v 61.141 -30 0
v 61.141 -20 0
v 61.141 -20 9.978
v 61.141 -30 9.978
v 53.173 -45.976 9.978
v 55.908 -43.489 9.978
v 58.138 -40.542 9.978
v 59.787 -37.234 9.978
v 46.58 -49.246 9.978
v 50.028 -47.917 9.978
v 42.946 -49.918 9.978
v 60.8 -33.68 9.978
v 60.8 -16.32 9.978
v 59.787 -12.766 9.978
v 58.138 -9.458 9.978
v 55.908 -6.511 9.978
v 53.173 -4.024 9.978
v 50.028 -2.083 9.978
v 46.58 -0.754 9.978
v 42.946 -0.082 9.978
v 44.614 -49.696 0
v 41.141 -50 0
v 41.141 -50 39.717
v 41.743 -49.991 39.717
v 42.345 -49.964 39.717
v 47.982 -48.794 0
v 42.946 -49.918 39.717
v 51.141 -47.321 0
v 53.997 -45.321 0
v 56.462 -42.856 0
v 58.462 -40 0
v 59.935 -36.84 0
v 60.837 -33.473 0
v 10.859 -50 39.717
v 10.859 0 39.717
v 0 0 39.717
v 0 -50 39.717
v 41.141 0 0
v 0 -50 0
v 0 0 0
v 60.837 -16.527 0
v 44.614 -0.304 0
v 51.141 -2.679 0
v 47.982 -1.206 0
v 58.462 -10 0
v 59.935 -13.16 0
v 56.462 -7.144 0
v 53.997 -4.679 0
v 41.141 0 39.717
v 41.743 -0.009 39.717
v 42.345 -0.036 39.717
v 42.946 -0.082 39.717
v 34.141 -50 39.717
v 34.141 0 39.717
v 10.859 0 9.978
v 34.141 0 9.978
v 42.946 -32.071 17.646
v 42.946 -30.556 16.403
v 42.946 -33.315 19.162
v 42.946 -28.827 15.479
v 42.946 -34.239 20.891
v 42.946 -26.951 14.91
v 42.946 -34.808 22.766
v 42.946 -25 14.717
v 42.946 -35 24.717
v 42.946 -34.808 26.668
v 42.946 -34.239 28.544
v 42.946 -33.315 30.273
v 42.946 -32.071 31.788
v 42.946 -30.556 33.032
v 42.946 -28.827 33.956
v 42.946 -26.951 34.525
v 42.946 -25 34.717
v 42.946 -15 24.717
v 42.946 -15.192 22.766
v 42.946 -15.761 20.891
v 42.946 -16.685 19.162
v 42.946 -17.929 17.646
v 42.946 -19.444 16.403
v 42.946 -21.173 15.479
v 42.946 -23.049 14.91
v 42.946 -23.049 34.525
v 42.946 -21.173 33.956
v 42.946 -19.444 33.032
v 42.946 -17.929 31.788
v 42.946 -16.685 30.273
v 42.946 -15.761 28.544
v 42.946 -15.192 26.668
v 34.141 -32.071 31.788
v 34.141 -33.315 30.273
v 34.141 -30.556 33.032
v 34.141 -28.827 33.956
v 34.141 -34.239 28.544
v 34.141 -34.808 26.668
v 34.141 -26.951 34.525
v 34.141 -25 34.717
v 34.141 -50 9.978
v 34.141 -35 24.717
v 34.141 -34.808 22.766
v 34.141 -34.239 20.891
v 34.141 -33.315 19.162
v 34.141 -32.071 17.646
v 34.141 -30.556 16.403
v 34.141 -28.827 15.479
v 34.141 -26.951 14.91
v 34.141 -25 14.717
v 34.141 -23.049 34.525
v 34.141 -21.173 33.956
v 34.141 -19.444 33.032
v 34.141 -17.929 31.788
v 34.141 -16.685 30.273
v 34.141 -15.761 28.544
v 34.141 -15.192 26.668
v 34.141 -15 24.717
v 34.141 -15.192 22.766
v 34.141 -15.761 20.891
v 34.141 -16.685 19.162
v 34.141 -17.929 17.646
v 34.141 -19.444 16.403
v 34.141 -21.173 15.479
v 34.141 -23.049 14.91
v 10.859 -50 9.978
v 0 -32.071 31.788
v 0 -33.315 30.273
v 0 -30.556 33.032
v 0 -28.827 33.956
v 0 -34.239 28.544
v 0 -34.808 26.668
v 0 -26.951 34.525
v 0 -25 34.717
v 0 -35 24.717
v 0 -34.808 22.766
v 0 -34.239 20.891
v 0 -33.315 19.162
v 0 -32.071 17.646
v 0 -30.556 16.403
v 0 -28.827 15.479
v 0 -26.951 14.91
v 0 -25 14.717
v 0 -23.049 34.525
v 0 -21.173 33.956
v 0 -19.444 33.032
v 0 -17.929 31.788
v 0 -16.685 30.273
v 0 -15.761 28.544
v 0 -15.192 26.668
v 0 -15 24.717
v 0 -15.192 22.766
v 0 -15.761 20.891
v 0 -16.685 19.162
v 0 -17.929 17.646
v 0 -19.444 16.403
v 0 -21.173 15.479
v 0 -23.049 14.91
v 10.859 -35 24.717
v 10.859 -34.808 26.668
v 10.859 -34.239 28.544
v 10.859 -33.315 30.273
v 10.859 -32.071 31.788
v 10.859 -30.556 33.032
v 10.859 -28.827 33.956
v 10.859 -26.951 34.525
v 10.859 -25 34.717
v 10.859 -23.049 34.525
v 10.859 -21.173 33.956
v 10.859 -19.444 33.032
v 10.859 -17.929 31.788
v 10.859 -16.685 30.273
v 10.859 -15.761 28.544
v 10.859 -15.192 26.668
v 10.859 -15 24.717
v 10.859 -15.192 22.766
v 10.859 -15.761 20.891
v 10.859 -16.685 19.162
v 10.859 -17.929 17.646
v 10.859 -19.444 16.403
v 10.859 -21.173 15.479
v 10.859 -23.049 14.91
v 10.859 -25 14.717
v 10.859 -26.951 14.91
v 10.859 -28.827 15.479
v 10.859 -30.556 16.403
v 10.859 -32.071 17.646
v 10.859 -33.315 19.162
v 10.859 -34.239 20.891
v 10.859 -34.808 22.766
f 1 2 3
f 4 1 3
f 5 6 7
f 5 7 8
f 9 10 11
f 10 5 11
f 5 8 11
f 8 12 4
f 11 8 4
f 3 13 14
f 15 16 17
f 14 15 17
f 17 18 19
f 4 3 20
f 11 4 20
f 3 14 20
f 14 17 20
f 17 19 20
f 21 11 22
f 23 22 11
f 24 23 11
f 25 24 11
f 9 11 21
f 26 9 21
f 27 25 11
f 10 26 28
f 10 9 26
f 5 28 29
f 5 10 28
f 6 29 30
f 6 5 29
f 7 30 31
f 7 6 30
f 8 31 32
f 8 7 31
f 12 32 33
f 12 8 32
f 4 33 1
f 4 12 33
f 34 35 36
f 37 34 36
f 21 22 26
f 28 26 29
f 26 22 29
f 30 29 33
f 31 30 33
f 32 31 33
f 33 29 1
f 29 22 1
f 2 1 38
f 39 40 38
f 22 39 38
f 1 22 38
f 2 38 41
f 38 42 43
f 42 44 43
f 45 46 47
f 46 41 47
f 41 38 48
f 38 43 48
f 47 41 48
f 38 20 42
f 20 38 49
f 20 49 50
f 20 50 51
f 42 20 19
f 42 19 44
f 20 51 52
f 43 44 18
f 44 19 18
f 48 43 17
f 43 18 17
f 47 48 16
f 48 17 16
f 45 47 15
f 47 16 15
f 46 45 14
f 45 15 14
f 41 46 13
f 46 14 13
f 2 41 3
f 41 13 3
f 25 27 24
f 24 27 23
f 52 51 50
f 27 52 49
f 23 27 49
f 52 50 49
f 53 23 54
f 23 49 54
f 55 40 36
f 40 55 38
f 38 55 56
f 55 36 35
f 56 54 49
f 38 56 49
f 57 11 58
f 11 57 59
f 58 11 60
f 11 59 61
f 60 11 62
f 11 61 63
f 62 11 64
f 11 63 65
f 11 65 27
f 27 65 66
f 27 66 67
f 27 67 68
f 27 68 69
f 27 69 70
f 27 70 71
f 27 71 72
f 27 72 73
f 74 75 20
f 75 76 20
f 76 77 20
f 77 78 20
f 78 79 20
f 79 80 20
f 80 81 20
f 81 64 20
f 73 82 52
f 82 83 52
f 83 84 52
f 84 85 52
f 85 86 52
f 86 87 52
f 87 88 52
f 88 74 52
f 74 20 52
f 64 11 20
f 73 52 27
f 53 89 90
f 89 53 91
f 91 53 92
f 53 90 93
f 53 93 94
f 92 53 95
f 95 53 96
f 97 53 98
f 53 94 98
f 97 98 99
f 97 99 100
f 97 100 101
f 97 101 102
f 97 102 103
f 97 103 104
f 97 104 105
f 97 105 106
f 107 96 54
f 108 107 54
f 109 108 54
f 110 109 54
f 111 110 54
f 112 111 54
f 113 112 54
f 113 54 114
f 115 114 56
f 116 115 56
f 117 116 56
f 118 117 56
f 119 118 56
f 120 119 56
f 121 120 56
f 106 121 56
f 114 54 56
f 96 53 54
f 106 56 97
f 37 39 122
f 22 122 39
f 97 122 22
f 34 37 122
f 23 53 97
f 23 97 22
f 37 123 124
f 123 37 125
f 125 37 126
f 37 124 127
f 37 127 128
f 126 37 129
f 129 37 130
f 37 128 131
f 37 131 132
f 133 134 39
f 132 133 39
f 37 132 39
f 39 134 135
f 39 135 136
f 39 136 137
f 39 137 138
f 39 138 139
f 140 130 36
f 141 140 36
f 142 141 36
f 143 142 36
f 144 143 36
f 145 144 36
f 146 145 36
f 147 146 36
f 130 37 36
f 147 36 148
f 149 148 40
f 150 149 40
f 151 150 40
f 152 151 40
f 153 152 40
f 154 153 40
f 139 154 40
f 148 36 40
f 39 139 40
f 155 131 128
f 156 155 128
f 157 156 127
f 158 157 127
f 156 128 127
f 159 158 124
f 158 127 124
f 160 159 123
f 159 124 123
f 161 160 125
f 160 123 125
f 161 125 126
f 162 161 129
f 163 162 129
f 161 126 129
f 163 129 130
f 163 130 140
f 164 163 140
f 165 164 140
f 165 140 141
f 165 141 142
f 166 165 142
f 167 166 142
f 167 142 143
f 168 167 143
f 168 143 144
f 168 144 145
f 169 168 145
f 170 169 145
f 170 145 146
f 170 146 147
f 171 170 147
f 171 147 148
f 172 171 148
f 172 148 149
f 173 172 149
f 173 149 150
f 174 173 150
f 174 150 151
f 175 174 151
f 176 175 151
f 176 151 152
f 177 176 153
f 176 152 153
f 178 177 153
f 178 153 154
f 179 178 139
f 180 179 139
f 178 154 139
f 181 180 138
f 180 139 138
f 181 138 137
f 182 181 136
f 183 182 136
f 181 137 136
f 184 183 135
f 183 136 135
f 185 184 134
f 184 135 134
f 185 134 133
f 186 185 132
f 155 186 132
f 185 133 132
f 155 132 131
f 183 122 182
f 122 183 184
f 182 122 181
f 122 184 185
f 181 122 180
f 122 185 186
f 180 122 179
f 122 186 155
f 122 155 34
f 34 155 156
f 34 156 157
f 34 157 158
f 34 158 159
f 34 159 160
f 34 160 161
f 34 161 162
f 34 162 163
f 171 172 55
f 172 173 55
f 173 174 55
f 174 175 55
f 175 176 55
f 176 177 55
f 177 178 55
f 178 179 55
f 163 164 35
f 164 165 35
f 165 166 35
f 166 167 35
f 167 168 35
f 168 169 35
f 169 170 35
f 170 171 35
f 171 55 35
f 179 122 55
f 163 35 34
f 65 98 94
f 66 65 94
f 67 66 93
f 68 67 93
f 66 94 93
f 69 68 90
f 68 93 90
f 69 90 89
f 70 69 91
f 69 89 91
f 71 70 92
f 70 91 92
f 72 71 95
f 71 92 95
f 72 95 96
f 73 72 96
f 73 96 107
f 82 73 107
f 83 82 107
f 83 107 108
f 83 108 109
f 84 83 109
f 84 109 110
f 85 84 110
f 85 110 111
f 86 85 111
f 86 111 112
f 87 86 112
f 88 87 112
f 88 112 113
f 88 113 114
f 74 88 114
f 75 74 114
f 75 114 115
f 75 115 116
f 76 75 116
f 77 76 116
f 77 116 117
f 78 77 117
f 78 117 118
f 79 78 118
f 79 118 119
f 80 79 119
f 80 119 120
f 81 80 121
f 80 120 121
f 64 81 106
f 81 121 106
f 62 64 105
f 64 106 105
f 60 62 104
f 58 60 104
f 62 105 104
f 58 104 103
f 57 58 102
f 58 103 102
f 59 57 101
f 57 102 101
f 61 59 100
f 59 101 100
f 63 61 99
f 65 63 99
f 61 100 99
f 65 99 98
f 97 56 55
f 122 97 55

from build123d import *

# Parameters (mm, degrees)
F1_DEPTH = 50
F2_R     = 10
F3_DEPTH = 61.142308
F4_R     = 20


with BuildPart() as f1:
    # F0 (on Front) → F1 (new body)
    with BuildSketch(Plane.XZ):
        Polygon((0, 39.717391), (0, 0), (61.141308, 0), (61.141308, 9.978262), (42.945653, 9.978262), (42.945653, 39.717391), (34.141306, 39.717391), (34.141306, 9.978262), (10.858696, 9.978262), (10.858696, 39.717391), align=None)
    extrude(amount=F1_DEPTH)

    # F2 (on face) → F3 (cut, through all)
    with BuildSketch(Plane(origin=(0, 0, 0), x_dir=(0, -1, 0), z_dir=(-1, 0, 0))):
        with Locations((25, 24.717391)):
            Circle(F2_R)
    extrude(amount=-F3_DEPTH, mode=Mode.SUBTRACT)

    # F4
    f4_edges = [f1.edges().sort_by_distance(p)[0] for p in [
        (61.141308, 0, 4.989131),
        (61.141308, -50, 4.989131),
    ]]
    fillet(f4_edges, radius=F4_R)


solid = f1.part
